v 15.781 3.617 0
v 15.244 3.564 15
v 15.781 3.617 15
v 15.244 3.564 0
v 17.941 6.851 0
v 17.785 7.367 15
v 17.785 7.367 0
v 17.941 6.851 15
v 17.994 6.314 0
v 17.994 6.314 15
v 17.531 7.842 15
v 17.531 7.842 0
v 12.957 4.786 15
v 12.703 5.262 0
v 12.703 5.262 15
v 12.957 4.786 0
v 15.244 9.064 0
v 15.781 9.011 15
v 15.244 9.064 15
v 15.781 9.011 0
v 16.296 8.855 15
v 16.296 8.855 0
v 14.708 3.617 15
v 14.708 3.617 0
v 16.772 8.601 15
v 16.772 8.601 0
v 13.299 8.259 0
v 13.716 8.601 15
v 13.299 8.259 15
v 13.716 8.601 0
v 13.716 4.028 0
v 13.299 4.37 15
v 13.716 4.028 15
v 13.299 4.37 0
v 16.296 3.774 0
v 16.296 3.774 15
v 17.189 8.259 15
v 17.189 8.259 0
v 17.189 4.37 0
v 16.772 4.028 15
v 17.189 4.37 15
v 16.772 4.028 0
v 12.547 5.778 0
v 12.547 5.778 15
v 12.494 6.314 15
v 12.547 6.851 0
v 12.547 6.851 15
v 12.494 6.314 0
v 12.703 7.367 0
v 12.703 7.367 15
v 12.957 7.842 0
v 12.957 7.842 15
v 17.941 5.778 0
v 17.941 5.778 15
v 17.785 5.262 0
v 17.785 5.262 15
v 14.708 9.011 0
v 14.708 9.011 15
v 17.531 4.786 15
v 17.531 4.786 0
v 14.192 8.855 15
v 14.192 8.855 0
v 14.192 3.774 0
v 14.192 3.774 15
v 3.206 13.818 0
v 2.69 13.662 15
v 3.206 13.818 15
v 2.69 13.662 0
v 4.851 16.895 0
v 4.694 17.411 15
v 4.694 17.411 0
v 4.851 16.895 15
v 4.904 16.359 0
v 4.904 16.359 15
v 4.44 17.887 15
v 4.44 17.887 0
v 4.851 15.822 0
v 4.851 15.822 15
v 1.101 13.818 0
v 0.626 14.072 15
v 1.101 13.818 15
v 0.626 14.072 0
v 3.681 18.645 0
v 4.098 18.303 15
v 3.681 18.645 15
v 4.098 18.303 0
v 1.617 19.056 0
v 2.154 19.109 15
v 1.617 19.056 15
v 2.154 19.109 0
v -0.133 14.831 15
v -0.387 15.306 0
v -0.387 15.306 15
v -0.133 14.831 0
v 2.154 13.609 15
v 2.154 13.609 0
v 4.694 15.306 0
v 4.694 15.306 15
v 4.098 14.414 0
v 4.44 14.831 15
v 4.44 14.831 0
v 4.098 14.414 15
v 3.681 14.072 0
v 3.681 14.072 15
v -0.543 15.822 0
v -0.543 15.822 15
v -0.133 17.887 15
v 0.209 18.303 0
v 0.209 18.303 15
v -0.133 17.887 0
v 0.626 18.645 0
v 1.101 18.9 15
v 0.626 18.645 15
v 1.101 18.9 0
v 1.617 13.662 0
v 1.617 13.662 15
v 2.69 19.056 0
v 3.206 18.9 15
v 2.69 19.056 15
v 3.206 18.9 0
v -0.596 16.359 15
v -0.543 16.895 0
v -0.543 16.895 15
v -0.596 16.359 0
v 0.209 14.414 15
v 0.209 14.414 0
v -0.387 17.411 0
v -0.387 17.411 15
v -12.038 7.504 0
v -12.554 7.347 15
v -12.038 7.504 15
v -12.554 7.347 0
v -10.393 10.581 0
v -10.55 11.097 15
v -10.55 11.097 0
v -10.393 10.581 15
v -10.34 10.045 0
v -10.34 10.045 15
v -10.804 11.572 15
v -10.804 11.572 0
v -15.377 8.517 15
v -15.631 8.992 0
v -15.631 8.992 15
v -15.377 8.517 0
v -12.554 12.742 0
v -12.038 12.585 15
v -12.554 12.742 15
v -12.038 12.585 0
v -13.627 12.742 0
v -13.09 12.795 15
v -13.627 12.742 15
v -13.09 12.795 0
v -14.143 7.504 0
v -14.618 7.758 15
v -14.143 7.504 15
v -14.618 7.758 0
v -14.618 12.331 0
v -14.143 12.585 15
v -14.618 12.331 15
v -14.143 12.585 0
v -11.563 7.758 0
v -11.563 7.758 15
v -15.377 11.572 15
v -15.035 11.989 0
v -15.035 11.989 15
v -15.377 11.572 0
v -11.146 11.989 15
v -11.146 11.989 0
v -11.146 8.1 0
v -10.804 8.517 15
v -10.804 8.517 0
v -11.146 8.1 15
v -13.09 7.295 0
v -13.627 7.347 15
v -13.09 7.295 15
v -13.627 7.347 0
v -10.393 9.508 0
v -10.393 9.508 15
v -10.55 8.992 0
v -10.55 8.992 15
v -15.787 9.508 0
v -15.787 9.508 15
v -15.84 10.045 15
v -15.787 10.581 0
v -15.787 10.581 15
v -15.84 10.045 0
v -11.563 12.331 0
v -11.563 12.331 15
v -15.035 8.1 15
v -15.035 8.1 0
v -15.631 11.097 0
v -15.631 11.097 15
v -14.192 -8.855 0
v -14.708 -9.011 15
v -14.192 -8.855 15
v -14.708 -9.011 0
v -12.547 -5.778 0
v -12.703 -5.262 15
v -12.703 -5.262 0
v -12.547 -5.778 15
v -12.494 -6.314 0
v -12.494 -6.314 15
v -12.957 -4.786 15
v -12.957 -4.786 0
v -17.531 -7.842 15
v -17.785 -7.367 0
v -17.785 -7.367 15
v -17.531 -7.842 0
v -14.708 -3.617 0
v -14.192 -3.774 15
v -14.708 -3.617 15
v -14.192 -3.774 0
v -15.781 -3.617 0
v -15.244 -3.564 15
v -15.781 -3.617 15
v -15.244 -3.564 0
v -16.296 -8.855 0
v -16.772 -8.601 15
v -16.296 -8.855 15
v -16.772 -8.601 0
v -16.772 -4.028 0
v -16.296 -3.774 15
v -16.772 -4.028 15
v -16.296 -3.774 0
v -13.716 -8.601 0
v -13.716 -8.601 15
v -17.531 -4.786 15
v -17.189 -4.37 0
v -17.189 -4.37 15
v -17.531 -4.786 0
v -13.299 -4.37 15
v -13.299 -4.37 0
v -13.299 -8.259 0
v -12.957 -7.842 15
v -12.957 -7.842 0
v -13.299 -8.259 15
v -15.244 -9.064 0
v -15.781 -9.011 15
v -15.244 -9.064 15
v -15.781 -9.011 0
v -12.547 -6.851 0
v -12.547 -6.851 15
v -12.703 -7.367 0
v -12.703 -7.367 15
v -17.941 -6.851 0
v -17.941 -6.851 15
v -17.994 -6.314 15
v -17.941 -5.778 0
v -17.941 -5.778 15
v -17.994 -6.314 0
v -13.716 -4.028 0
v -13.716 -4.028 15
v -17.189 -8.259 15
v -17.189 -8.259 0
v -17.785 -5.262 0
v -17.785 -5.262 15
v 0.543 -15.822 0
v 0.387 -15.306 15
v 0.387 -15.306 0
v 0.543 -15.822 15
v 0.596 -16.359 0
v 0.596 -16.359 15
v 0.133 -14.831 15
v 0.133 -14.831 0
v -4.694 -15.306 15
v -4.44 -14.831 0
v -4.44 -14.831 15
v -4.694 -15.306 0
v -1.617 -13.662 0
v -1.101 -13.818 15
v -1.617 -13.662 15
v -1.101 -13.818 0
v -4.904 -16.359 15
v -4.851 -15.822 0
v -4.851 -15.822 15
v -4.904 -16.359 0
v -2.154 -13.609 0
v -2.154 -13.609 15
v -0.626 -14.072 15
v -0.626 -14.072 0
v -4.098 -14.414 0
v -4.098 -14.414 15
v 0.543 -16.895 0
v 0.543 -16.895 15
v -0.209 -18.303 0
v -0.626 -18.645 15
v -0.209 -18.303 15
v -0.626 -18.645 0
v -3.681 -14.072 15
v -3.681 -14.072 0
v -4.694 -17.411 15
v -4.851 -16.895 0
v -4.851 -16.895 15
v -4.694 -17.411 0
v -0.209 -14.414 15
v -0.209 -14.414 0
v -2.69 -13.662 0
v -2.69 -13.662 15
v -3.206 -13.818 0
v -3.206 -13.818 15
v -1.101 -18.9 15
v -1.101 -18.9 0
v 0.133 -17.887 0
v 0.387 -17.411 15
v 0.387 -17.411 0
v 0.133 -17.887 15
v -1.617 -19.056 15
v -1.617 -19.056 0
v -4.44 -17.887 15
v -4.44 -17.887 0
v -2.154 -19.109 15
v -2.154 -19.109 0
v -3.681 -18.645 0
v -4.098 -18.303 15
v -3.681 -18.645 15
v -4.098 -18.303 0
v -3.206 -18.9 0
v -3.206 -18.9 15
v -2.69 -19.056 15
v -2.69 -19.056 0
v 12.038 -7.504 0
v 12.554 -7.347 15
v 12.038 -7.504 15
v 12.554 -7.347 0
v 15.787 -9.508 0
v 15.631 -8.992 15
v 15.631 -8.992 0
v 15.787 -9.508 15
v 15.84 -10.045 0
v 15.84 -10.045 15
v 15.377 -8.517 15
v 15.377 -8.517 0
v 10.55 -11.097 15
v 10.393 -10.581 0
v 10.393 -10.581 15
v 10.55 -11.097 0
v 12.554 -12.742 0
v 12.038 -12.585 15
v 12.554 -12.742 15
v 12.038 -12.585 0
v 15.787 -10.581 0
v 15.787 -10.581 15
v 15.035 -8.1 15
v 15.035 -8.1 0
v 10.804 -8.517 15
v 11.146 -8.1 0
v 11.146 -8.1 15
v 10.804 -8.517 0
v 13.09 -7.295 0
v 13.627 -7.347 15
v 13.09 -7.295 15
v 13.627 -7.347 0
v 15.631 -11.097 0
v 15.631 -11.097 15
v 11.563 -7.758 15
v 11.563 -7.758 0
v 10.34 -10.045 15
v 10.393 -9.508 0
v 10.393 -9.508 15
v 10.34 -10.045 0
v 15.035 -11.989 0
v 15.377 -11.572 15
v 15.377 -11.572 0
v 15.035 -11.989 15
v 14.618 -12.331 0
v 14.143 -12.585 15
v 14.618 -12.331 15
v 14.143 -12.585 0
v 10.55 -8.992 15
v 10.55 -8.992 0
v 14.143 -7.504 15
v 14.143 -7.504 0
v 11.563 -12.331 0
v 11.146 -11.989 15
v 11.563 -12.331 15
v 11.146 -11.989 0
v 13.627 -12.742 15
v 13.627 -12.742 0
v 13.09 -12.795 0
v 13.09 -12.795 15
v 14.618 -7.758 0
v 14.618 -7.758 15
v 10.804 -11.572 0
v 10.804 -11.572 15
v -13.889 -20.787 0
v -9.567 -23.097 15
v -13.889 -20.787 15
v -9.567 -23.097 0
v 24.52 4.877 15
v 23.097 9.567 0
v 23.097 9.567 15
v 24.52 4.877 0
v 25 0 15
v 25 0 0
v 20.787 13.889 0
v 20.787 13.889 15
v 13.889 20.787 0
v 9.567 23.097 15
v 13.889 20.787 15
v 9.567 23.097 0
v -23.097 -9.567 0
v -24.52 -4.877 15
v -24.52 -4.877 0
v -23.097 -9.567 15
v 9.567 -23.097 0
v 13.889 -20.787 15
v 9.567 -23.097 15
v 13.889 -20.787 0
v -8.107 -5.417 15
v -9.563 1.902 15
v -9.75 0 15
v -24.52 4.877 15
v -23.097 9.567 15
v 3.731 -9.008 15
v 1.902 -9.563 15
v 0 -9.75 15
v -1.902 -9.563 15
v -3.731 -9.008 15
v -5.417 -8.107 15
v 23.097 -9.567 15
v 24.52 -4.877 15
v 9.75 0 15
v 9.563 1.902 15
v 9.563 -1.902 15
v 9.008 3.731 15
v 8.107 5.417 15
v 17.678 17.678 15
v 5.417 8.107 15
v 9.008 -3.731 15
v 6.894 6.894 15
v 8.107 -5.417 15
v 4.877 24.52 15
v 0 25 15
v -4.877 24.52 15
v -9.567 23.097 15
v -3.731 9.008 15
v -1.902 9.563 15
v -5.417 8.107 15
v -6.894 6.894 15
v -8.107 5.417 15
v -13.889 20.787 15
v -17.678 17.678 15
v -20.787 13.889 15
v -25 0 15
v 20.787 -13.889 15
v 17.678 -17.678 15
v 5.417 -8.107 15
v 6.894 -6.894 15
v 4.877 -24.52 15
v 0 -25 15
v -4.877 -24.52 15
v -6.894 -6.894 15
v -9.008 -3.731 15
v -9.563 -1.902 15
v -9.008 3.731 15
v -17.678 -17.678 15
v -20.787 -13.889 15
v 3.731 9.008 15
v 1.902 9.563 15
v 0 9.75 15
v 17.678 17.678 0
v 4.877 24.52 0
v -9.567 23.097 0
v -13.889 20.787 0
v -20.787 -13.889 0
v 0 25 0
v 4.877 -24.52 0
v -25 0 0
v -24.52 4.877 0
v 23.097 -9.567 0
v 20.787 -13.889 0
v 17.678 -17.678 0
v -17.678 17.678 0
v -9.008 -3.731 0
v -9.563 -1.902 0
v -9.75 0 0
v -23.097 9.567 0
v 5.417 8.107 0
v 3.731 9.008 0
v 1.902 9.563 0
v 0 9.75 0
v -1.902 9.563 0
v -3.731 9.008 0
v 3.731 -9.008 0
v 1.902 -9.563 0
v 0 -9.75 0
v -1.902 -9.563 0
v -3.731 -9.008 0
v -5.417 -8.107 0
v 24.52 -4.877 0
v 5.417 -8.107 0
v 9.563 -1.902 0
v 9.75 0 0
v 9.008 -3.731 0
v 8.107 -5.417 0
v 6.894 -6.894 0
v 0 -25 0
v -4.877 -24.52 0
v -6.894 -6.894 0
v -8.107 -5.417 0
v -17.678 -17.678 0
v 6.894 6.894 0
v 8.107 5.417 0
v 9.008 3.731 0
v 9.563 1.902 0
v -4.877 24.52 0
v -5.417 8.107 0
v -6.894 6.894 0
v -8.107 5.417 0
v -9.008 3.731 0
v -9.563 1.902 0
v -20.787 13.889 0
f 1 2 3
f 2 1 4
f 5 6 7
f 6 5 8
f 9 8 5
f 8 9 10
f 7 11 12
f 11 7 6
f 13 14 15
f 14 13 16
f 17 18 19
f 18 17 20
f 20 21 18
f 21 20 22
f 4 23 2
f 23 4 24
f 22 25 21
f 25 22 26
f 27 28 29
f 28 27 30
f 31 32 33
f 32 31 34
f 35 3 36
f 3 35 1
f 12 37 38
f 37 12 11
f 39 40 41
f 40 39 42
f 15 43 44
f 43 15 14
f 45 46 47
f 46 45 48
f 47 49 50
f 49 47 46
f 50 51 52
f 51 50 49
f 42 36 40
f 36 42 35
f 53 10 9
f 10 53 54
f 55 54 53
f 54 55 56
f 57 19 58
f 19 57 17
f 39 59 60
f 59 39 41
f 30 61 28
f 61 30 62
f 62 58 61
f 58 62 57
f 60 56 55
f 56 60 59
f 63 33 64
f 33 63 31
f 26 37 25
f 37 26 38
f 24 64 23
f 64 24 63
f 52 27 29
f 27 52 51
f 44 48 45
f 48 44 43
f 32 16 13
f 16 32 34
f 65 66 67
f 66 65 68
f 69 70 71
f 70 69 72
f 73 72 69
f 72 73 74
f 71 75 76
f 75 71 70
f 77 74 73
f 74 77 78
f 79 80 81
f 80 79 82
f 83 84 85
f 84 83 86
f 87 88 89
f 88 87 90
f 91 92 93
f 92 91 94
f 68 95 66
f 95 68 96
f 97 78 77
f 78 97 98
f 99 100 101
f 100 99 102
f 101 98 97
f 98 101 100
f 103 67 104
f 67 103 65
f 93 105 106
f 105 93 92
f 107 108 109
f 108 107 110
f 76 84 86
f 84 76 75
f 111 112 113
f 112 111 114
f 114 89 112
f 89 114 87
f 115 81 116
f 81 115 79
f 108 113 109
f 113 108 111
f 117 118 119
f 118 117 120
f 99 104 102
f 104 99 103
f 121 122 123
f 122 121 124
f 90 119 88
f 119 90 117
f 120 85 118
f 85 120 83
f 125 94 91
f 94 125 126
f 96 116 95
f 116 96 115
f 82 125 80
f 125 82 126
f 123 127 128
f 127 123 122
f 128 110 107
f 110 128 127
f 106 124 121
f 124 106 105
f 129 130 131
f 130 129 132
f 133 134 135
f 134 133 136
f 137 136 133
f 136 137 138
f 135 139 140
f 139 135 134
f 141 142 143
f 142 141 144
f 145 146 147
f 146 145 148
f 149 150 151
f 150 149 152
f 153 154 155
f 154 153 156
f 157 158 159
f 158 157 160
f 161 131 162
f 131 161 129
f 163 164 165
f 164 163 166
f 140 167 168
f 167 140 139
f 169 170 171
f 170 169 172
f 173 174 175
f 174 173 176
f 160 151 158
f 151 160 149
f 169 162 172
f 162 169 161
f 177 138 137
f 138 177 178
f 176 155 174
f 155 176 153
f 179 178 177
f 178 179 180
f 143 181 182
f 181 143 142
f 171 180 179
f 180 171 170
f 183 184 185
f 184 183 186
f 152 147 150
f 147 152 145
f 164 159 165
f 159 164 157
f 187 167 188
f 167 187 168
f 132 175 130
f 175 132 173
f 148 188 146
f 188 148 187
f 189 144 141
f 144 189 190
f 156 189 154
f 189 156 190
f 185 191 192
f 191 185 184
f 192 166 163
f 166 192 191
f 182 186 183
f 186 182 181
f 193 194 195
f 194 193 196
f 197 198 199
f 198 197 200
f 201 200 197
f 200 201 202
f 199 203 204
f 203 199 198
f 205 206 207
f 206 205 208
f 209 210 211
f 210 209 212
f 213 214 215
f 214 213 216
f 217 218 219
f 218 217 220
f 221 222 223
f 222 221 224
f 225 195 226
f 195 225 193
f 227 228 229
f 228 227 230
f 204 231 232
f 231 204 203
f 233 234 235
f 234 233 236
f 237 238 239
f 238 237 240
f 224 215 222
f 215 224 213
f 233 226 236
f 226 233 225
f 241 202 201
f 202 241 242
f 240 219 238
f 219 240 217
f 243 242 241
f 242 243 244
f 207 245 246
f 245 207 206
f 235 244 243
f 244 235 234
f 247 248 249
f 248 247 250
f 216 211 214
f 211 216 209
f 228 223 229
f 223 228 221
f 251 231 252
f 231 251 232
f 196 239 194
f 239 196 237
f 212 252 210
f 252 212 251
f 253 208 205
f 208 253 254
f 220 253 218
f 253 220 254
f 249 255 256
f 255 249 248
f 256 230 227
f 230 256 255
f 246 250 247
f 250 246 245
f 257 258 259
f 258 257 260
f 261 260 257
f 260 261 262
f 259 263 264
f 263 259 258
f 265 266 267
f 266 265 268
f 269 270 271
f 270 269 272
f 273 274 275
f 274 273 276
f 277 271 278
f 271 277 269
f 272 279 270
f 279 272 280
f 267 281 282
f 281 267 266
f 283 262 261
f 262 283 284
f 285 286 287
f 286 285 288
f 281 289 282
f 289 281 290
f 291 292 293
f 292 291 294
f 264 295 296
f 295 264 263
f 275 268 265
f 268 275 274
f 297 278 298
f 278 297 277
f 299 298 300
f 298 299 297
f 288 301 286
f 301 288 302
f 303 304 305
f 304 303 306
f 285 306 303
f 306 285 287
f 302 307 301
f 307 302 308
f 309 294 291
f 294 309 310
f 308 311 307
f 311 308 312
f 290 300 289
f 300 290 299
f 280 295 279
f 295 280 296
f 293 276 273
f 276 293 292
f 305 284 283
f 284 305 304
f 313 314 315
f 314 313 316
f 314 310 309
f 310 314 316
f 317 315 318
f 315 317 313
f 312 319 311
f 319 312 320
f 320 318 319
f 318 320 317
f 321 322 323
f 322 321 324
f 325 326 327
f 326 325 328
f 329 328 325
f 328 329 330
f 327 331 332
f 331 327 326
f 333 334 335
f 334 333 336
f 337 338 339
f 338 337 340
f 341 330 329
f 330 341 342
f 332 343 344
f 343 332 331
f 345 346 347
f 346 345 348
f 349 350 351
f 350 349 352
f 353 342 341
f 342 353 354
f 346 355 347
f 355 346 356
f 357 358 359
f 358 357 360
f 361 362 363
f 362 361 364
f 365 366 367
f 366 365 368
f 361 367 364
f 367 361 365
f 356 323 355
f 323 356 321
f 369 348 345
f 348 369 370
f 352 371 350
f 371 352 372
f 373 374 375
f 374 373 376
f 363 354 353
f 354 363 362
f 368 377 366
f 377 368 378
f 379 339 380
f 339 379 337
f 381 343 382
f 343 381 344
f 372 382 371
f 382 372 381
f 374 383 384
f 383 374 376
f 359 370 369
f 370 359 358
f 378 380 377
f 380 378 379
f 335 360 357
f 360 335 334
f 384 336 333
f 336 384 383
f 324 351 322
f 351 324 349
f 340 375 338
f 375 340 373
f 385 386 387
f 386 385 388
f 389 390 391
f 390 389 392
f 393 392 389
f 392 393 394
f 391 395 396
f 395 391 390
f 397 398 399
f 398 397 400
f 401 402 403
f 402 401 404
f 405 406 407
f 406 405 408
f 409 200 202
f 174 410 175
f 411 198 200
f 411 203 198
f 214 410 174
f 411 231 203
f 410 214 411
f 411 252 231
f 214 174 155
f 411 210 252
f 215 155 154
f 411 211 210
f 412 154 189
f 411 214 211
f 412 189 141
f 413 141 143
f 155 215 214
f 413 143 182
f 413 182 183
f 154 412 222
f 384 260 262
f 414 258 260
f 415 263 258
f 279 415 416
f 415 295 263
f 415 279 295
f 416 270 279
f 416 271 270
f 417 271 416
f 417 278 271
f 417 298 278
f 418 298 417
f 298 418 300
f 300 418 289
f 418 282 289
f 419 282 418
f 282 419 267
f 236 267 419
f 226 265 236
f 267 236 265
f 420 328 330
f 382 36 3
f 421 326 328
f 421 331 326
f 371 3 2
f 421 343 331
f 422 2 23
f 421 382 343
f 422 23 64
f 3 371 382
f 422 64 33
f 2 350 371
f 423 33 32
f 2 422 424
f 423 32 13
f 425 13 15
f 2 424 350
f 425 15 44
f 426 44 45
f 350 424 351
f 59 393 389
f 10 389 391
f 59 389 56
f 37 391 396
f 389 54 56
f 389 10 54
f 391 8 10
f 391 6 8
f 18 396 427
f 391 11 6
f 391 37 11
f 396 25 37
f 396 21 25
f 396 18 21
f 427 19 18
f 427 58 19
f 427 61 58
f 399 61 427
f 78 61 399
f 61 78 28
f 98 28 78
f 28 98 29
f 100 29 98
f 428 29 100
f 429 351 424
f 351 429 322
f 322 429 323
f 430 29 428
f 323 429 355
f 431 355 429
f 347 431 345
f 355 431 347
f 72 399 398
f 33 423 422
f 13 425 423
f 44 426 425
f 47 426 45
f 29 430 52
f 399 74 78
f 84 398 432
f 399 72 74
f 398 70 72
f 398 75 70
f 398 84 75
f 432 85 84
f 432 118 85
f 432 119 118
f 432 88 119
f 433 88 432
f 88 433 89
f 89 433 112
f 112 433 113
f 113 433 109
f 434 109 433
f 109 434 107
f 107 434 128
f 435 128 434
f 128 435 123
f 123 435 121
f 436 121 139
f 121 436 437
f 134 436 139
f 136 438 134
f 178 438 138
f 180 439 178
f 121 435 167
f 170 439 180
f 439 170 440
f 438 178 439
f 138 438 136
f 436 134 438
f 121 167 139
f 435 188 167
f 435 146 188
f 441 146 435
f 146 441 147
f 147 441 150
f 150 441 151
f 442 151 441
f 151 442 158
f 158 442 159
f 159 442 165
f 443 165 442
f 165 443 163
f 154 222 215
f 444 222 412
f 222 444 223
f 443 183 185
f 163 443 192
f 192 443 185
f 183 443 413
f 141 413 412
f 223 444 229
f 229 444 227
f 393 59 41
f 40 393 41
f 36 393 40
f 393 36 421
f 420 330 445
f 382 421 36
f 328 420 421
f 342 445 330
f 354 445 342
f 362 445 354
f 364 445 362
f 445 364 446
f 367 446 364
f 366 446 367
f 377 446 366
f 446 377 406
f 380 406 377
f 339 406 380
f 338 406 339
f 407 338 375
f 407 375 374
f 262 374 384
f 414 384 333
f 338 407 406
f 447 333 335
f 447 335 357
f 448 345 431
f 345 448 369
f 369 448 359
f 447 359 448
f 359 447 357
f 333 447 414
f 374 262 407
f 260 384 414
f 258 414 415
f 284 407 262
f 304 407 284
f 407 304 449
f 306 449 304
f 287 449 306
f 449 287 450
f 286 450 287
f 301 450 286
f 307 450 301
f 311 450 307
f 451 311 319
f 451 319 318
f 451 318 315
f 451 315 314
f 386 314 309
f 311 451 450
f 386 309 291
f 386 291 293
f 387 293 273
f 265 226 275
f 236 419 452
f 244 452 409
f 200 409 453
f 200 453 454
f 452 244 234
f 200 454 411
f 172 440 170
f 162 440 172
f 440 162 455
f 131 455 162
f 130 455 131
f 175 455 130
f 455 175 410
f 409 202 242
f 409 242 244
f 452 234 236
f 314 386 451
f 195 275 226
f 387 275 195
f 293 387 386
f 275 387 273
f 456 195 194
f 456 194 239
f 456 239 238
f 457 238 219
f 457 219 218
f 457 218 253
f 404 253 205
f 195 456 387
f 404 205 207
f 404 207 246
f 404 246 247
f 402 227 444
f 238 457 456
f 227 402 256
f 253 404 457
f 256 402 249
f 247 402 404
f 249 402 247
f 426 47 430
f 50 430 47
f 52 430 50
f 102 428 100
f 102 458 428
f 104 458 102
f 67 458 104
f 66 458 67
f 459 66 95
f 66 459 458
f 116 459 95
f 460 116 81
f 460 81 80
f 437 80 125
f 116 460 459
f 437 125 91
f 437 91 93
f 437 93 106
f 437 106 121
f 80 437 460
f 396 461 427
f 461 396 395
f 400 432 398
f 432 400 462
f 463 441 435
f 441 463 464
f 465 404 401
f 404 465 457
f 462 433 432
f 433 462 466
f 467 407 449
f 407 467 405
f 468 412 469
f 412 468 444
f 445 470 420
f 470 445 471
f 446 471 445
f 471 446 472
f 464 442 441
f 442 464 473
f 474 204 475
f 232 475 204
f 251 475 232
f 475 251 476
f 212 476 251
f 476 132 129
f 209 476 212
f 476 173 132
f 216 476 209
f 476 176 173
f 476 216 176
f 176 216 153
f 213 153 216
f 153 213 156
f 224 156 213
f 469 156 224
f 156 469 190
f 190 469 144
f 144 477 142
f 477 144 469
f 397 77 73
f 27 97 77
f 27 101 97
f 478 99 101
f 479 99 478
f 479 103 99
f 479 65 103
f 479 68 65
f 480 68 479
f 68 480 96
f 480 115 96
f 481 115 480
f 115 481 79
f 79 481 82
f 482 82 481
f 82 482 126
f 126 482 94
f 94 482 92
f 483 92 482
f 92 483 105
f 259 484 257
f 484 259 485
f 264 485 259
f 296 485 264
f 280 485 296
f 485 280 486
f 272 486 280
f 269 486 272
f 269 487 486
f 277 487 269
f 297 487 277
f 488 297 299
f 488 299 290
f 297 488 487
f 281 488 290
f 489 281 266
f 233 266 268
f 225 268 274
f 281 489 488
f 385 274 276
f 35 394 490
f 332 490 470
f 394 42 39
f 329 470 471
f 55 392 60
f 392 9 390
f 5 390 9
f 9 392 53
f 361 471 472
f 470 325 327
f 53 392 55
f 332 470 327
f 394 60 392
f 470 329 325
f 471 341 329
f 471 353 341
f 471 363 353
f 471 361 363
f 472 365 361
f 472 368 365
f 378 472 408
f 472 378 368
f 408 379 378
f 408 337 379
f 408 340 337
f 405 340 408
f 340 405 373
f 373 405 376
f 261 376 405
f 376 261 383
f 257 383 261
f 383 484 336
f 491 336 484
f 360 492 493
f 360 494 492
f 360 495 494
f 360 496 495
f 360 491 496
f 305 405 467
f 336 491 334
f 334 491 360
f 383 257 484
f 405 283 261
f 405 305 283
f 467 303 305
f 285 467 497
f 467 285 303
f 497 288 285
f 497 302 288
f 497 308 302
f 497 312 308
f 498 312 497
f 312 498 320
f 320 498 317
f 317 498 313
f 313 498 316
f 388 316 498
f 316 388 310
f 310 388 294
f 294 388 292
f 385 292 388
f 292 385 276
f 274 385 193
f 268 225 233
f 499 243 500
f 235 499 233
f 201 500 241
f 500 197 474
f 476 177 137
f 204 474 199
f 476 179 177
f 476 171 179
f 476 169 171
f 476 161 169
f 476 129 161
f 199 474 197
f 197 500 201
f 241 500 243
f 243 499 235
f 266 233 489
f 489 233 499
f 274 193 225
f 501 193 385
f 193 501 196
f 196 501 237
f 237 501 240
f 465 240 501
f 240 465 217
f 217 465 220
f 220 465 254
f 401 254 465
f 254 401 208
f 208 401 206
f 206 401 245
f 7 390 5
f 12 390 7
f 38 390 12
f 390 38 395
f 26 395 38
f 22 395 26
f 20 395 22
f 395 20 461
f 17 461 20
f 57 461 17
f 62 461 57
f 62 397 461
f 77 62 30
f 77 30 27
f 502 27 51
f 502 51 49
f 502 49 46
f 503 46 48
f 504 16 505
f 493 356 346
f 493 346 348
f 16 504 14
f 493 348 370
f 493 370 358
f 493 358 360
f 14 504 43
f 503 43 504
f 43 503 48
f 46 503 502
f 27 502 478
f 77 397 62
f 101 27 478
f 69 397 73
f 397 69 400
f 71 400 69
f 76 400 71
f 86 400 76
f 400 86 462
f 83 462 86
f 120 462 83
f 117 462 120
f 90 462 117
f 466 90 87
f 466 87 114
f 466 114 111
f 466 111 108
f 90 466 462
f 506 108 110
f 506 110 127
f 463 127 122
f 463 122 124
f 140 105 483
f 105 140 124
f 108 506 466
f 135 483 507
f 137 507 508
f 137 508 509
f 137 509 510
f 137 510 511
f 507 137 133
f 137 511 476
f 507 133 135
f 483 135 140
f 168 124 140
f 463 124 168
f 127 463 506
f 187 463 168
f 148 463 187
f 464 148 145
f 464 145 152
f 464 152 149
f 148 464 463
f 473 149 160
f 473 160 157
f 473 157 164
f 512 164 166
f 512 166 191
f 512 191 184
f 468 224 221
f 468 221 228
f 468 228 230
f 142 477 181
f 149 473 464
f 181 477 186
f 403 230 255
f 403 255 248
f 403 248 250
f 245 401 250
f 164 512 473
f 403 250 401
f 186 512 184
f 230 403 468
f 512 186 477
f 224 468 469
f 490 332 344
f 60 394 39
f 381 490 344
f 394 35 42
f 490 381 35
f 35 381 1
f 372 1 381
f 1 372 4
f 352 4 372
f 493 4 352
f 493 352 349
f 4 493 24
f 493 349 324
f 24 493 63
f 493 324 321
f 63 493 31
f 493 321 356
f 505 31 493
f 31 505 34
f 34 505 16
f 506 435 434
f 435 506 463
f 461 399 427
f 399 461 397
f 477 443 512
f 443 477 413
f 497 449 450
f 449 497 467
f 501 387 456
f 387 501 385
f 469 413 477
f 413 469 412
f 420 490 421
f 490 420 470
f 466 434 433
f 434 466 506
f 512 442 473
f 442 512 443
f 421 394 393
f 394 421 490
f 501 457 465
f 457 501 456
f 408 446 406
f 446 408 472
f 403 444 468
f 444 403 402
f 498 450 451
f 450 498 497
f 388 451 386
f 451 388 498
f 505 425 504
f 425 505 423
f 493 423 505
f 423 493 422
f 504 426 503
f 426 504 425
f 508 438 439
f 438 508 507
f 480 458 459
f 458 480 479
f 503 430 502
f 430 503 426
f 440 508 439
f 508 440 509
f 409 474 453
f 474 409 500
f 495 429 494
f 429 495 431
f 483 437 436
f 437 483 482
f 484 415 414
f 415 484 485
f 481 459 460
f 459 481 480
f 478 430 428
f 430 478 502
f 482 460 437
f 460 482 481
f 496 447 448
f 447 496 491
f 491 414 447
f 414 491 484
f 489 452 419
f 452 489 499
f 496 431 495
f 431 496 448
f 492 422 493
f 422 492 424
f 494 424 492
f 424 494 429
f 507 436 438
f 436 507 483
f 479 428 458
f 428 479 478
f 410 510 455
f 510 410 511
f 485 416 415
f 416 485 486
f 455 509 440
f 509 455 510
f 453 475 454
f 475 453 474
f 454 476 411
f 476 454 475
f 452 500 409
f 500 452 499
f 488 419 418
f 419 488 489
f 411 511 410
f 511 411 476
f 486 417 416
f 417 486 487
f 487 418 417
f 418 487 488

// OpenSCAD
$fn = 32;

// ----------------------------------------------------------------------
// Flange Ø50 x 15
// 6 holes on a Ø33 bolt circle, bolted joints
// ----------------------------------------------------------------------

// --- parameters (mm) ---
flange_d = 50;     // outside diameter of the flange
thickness = 15;    // flange thickness
holes = 6;         // number of bolt holes
pcd = 33;          // bolt circle diameter
start_deg = 22.5;  // angle of the first hole, from +X
hole_d = 5.5;      // bolt hole diameter
bore_d = 19.5;     // central through bore
hub_d = 31.5;      // hub outside diameter
hub_h = 0;         // hub height above the flange face (0 = no hub)

// --- derived feature positions (mm) ---
height = thickness + hub_h;  // = 15   overall height of the part
pcd_r = pcd / 2;             // = 16.5   bolt circle radius
hole_step = 360 / holes;     // = 60   angular pitch
feature_centers = [
  [pcd_r * cos(start_deg + 0 * hole_step), pcd_r * sin(start_deg + 0 * hole_step)],
  [pcd_r * cos(start_deg + 1 * hole_step), pcd_r * sin(start_deg + 1 * hole_step)],
  [pcd_r * cos(start_deg + 2 * hole_step), pcd_r * sin(start_deg + 2 * hole_step)],
  [pcd_r * cos(start_deg + 3 * hole_step), pcd_r * sin(start_deg + 3 * hole_step)],
  [pcd_r * cos(start_deg + 4 * hole_step), pcd_r * sin(start_deg + 4 * hole_step)],
  [pcd_r * cos(start_deg + 5 * hole_step), pcd_r * sin(start_deg + 5 * hole_step)]
];   // bolt hole centres on the pitch circle

// flange disc, every hole and the bore cut straight through
difference() {
  union() {
    cylinder(d = flange_d, h = thickness);
  }
  translate([0, 0, -1]) cylinder(d = bore_d, h = height + 2);  // bore, through
  for (centre = feature_centers)
    translate([centre[0], centre[1], -1]) cylinder(d = hole_d, h = thickness + 2);
}
